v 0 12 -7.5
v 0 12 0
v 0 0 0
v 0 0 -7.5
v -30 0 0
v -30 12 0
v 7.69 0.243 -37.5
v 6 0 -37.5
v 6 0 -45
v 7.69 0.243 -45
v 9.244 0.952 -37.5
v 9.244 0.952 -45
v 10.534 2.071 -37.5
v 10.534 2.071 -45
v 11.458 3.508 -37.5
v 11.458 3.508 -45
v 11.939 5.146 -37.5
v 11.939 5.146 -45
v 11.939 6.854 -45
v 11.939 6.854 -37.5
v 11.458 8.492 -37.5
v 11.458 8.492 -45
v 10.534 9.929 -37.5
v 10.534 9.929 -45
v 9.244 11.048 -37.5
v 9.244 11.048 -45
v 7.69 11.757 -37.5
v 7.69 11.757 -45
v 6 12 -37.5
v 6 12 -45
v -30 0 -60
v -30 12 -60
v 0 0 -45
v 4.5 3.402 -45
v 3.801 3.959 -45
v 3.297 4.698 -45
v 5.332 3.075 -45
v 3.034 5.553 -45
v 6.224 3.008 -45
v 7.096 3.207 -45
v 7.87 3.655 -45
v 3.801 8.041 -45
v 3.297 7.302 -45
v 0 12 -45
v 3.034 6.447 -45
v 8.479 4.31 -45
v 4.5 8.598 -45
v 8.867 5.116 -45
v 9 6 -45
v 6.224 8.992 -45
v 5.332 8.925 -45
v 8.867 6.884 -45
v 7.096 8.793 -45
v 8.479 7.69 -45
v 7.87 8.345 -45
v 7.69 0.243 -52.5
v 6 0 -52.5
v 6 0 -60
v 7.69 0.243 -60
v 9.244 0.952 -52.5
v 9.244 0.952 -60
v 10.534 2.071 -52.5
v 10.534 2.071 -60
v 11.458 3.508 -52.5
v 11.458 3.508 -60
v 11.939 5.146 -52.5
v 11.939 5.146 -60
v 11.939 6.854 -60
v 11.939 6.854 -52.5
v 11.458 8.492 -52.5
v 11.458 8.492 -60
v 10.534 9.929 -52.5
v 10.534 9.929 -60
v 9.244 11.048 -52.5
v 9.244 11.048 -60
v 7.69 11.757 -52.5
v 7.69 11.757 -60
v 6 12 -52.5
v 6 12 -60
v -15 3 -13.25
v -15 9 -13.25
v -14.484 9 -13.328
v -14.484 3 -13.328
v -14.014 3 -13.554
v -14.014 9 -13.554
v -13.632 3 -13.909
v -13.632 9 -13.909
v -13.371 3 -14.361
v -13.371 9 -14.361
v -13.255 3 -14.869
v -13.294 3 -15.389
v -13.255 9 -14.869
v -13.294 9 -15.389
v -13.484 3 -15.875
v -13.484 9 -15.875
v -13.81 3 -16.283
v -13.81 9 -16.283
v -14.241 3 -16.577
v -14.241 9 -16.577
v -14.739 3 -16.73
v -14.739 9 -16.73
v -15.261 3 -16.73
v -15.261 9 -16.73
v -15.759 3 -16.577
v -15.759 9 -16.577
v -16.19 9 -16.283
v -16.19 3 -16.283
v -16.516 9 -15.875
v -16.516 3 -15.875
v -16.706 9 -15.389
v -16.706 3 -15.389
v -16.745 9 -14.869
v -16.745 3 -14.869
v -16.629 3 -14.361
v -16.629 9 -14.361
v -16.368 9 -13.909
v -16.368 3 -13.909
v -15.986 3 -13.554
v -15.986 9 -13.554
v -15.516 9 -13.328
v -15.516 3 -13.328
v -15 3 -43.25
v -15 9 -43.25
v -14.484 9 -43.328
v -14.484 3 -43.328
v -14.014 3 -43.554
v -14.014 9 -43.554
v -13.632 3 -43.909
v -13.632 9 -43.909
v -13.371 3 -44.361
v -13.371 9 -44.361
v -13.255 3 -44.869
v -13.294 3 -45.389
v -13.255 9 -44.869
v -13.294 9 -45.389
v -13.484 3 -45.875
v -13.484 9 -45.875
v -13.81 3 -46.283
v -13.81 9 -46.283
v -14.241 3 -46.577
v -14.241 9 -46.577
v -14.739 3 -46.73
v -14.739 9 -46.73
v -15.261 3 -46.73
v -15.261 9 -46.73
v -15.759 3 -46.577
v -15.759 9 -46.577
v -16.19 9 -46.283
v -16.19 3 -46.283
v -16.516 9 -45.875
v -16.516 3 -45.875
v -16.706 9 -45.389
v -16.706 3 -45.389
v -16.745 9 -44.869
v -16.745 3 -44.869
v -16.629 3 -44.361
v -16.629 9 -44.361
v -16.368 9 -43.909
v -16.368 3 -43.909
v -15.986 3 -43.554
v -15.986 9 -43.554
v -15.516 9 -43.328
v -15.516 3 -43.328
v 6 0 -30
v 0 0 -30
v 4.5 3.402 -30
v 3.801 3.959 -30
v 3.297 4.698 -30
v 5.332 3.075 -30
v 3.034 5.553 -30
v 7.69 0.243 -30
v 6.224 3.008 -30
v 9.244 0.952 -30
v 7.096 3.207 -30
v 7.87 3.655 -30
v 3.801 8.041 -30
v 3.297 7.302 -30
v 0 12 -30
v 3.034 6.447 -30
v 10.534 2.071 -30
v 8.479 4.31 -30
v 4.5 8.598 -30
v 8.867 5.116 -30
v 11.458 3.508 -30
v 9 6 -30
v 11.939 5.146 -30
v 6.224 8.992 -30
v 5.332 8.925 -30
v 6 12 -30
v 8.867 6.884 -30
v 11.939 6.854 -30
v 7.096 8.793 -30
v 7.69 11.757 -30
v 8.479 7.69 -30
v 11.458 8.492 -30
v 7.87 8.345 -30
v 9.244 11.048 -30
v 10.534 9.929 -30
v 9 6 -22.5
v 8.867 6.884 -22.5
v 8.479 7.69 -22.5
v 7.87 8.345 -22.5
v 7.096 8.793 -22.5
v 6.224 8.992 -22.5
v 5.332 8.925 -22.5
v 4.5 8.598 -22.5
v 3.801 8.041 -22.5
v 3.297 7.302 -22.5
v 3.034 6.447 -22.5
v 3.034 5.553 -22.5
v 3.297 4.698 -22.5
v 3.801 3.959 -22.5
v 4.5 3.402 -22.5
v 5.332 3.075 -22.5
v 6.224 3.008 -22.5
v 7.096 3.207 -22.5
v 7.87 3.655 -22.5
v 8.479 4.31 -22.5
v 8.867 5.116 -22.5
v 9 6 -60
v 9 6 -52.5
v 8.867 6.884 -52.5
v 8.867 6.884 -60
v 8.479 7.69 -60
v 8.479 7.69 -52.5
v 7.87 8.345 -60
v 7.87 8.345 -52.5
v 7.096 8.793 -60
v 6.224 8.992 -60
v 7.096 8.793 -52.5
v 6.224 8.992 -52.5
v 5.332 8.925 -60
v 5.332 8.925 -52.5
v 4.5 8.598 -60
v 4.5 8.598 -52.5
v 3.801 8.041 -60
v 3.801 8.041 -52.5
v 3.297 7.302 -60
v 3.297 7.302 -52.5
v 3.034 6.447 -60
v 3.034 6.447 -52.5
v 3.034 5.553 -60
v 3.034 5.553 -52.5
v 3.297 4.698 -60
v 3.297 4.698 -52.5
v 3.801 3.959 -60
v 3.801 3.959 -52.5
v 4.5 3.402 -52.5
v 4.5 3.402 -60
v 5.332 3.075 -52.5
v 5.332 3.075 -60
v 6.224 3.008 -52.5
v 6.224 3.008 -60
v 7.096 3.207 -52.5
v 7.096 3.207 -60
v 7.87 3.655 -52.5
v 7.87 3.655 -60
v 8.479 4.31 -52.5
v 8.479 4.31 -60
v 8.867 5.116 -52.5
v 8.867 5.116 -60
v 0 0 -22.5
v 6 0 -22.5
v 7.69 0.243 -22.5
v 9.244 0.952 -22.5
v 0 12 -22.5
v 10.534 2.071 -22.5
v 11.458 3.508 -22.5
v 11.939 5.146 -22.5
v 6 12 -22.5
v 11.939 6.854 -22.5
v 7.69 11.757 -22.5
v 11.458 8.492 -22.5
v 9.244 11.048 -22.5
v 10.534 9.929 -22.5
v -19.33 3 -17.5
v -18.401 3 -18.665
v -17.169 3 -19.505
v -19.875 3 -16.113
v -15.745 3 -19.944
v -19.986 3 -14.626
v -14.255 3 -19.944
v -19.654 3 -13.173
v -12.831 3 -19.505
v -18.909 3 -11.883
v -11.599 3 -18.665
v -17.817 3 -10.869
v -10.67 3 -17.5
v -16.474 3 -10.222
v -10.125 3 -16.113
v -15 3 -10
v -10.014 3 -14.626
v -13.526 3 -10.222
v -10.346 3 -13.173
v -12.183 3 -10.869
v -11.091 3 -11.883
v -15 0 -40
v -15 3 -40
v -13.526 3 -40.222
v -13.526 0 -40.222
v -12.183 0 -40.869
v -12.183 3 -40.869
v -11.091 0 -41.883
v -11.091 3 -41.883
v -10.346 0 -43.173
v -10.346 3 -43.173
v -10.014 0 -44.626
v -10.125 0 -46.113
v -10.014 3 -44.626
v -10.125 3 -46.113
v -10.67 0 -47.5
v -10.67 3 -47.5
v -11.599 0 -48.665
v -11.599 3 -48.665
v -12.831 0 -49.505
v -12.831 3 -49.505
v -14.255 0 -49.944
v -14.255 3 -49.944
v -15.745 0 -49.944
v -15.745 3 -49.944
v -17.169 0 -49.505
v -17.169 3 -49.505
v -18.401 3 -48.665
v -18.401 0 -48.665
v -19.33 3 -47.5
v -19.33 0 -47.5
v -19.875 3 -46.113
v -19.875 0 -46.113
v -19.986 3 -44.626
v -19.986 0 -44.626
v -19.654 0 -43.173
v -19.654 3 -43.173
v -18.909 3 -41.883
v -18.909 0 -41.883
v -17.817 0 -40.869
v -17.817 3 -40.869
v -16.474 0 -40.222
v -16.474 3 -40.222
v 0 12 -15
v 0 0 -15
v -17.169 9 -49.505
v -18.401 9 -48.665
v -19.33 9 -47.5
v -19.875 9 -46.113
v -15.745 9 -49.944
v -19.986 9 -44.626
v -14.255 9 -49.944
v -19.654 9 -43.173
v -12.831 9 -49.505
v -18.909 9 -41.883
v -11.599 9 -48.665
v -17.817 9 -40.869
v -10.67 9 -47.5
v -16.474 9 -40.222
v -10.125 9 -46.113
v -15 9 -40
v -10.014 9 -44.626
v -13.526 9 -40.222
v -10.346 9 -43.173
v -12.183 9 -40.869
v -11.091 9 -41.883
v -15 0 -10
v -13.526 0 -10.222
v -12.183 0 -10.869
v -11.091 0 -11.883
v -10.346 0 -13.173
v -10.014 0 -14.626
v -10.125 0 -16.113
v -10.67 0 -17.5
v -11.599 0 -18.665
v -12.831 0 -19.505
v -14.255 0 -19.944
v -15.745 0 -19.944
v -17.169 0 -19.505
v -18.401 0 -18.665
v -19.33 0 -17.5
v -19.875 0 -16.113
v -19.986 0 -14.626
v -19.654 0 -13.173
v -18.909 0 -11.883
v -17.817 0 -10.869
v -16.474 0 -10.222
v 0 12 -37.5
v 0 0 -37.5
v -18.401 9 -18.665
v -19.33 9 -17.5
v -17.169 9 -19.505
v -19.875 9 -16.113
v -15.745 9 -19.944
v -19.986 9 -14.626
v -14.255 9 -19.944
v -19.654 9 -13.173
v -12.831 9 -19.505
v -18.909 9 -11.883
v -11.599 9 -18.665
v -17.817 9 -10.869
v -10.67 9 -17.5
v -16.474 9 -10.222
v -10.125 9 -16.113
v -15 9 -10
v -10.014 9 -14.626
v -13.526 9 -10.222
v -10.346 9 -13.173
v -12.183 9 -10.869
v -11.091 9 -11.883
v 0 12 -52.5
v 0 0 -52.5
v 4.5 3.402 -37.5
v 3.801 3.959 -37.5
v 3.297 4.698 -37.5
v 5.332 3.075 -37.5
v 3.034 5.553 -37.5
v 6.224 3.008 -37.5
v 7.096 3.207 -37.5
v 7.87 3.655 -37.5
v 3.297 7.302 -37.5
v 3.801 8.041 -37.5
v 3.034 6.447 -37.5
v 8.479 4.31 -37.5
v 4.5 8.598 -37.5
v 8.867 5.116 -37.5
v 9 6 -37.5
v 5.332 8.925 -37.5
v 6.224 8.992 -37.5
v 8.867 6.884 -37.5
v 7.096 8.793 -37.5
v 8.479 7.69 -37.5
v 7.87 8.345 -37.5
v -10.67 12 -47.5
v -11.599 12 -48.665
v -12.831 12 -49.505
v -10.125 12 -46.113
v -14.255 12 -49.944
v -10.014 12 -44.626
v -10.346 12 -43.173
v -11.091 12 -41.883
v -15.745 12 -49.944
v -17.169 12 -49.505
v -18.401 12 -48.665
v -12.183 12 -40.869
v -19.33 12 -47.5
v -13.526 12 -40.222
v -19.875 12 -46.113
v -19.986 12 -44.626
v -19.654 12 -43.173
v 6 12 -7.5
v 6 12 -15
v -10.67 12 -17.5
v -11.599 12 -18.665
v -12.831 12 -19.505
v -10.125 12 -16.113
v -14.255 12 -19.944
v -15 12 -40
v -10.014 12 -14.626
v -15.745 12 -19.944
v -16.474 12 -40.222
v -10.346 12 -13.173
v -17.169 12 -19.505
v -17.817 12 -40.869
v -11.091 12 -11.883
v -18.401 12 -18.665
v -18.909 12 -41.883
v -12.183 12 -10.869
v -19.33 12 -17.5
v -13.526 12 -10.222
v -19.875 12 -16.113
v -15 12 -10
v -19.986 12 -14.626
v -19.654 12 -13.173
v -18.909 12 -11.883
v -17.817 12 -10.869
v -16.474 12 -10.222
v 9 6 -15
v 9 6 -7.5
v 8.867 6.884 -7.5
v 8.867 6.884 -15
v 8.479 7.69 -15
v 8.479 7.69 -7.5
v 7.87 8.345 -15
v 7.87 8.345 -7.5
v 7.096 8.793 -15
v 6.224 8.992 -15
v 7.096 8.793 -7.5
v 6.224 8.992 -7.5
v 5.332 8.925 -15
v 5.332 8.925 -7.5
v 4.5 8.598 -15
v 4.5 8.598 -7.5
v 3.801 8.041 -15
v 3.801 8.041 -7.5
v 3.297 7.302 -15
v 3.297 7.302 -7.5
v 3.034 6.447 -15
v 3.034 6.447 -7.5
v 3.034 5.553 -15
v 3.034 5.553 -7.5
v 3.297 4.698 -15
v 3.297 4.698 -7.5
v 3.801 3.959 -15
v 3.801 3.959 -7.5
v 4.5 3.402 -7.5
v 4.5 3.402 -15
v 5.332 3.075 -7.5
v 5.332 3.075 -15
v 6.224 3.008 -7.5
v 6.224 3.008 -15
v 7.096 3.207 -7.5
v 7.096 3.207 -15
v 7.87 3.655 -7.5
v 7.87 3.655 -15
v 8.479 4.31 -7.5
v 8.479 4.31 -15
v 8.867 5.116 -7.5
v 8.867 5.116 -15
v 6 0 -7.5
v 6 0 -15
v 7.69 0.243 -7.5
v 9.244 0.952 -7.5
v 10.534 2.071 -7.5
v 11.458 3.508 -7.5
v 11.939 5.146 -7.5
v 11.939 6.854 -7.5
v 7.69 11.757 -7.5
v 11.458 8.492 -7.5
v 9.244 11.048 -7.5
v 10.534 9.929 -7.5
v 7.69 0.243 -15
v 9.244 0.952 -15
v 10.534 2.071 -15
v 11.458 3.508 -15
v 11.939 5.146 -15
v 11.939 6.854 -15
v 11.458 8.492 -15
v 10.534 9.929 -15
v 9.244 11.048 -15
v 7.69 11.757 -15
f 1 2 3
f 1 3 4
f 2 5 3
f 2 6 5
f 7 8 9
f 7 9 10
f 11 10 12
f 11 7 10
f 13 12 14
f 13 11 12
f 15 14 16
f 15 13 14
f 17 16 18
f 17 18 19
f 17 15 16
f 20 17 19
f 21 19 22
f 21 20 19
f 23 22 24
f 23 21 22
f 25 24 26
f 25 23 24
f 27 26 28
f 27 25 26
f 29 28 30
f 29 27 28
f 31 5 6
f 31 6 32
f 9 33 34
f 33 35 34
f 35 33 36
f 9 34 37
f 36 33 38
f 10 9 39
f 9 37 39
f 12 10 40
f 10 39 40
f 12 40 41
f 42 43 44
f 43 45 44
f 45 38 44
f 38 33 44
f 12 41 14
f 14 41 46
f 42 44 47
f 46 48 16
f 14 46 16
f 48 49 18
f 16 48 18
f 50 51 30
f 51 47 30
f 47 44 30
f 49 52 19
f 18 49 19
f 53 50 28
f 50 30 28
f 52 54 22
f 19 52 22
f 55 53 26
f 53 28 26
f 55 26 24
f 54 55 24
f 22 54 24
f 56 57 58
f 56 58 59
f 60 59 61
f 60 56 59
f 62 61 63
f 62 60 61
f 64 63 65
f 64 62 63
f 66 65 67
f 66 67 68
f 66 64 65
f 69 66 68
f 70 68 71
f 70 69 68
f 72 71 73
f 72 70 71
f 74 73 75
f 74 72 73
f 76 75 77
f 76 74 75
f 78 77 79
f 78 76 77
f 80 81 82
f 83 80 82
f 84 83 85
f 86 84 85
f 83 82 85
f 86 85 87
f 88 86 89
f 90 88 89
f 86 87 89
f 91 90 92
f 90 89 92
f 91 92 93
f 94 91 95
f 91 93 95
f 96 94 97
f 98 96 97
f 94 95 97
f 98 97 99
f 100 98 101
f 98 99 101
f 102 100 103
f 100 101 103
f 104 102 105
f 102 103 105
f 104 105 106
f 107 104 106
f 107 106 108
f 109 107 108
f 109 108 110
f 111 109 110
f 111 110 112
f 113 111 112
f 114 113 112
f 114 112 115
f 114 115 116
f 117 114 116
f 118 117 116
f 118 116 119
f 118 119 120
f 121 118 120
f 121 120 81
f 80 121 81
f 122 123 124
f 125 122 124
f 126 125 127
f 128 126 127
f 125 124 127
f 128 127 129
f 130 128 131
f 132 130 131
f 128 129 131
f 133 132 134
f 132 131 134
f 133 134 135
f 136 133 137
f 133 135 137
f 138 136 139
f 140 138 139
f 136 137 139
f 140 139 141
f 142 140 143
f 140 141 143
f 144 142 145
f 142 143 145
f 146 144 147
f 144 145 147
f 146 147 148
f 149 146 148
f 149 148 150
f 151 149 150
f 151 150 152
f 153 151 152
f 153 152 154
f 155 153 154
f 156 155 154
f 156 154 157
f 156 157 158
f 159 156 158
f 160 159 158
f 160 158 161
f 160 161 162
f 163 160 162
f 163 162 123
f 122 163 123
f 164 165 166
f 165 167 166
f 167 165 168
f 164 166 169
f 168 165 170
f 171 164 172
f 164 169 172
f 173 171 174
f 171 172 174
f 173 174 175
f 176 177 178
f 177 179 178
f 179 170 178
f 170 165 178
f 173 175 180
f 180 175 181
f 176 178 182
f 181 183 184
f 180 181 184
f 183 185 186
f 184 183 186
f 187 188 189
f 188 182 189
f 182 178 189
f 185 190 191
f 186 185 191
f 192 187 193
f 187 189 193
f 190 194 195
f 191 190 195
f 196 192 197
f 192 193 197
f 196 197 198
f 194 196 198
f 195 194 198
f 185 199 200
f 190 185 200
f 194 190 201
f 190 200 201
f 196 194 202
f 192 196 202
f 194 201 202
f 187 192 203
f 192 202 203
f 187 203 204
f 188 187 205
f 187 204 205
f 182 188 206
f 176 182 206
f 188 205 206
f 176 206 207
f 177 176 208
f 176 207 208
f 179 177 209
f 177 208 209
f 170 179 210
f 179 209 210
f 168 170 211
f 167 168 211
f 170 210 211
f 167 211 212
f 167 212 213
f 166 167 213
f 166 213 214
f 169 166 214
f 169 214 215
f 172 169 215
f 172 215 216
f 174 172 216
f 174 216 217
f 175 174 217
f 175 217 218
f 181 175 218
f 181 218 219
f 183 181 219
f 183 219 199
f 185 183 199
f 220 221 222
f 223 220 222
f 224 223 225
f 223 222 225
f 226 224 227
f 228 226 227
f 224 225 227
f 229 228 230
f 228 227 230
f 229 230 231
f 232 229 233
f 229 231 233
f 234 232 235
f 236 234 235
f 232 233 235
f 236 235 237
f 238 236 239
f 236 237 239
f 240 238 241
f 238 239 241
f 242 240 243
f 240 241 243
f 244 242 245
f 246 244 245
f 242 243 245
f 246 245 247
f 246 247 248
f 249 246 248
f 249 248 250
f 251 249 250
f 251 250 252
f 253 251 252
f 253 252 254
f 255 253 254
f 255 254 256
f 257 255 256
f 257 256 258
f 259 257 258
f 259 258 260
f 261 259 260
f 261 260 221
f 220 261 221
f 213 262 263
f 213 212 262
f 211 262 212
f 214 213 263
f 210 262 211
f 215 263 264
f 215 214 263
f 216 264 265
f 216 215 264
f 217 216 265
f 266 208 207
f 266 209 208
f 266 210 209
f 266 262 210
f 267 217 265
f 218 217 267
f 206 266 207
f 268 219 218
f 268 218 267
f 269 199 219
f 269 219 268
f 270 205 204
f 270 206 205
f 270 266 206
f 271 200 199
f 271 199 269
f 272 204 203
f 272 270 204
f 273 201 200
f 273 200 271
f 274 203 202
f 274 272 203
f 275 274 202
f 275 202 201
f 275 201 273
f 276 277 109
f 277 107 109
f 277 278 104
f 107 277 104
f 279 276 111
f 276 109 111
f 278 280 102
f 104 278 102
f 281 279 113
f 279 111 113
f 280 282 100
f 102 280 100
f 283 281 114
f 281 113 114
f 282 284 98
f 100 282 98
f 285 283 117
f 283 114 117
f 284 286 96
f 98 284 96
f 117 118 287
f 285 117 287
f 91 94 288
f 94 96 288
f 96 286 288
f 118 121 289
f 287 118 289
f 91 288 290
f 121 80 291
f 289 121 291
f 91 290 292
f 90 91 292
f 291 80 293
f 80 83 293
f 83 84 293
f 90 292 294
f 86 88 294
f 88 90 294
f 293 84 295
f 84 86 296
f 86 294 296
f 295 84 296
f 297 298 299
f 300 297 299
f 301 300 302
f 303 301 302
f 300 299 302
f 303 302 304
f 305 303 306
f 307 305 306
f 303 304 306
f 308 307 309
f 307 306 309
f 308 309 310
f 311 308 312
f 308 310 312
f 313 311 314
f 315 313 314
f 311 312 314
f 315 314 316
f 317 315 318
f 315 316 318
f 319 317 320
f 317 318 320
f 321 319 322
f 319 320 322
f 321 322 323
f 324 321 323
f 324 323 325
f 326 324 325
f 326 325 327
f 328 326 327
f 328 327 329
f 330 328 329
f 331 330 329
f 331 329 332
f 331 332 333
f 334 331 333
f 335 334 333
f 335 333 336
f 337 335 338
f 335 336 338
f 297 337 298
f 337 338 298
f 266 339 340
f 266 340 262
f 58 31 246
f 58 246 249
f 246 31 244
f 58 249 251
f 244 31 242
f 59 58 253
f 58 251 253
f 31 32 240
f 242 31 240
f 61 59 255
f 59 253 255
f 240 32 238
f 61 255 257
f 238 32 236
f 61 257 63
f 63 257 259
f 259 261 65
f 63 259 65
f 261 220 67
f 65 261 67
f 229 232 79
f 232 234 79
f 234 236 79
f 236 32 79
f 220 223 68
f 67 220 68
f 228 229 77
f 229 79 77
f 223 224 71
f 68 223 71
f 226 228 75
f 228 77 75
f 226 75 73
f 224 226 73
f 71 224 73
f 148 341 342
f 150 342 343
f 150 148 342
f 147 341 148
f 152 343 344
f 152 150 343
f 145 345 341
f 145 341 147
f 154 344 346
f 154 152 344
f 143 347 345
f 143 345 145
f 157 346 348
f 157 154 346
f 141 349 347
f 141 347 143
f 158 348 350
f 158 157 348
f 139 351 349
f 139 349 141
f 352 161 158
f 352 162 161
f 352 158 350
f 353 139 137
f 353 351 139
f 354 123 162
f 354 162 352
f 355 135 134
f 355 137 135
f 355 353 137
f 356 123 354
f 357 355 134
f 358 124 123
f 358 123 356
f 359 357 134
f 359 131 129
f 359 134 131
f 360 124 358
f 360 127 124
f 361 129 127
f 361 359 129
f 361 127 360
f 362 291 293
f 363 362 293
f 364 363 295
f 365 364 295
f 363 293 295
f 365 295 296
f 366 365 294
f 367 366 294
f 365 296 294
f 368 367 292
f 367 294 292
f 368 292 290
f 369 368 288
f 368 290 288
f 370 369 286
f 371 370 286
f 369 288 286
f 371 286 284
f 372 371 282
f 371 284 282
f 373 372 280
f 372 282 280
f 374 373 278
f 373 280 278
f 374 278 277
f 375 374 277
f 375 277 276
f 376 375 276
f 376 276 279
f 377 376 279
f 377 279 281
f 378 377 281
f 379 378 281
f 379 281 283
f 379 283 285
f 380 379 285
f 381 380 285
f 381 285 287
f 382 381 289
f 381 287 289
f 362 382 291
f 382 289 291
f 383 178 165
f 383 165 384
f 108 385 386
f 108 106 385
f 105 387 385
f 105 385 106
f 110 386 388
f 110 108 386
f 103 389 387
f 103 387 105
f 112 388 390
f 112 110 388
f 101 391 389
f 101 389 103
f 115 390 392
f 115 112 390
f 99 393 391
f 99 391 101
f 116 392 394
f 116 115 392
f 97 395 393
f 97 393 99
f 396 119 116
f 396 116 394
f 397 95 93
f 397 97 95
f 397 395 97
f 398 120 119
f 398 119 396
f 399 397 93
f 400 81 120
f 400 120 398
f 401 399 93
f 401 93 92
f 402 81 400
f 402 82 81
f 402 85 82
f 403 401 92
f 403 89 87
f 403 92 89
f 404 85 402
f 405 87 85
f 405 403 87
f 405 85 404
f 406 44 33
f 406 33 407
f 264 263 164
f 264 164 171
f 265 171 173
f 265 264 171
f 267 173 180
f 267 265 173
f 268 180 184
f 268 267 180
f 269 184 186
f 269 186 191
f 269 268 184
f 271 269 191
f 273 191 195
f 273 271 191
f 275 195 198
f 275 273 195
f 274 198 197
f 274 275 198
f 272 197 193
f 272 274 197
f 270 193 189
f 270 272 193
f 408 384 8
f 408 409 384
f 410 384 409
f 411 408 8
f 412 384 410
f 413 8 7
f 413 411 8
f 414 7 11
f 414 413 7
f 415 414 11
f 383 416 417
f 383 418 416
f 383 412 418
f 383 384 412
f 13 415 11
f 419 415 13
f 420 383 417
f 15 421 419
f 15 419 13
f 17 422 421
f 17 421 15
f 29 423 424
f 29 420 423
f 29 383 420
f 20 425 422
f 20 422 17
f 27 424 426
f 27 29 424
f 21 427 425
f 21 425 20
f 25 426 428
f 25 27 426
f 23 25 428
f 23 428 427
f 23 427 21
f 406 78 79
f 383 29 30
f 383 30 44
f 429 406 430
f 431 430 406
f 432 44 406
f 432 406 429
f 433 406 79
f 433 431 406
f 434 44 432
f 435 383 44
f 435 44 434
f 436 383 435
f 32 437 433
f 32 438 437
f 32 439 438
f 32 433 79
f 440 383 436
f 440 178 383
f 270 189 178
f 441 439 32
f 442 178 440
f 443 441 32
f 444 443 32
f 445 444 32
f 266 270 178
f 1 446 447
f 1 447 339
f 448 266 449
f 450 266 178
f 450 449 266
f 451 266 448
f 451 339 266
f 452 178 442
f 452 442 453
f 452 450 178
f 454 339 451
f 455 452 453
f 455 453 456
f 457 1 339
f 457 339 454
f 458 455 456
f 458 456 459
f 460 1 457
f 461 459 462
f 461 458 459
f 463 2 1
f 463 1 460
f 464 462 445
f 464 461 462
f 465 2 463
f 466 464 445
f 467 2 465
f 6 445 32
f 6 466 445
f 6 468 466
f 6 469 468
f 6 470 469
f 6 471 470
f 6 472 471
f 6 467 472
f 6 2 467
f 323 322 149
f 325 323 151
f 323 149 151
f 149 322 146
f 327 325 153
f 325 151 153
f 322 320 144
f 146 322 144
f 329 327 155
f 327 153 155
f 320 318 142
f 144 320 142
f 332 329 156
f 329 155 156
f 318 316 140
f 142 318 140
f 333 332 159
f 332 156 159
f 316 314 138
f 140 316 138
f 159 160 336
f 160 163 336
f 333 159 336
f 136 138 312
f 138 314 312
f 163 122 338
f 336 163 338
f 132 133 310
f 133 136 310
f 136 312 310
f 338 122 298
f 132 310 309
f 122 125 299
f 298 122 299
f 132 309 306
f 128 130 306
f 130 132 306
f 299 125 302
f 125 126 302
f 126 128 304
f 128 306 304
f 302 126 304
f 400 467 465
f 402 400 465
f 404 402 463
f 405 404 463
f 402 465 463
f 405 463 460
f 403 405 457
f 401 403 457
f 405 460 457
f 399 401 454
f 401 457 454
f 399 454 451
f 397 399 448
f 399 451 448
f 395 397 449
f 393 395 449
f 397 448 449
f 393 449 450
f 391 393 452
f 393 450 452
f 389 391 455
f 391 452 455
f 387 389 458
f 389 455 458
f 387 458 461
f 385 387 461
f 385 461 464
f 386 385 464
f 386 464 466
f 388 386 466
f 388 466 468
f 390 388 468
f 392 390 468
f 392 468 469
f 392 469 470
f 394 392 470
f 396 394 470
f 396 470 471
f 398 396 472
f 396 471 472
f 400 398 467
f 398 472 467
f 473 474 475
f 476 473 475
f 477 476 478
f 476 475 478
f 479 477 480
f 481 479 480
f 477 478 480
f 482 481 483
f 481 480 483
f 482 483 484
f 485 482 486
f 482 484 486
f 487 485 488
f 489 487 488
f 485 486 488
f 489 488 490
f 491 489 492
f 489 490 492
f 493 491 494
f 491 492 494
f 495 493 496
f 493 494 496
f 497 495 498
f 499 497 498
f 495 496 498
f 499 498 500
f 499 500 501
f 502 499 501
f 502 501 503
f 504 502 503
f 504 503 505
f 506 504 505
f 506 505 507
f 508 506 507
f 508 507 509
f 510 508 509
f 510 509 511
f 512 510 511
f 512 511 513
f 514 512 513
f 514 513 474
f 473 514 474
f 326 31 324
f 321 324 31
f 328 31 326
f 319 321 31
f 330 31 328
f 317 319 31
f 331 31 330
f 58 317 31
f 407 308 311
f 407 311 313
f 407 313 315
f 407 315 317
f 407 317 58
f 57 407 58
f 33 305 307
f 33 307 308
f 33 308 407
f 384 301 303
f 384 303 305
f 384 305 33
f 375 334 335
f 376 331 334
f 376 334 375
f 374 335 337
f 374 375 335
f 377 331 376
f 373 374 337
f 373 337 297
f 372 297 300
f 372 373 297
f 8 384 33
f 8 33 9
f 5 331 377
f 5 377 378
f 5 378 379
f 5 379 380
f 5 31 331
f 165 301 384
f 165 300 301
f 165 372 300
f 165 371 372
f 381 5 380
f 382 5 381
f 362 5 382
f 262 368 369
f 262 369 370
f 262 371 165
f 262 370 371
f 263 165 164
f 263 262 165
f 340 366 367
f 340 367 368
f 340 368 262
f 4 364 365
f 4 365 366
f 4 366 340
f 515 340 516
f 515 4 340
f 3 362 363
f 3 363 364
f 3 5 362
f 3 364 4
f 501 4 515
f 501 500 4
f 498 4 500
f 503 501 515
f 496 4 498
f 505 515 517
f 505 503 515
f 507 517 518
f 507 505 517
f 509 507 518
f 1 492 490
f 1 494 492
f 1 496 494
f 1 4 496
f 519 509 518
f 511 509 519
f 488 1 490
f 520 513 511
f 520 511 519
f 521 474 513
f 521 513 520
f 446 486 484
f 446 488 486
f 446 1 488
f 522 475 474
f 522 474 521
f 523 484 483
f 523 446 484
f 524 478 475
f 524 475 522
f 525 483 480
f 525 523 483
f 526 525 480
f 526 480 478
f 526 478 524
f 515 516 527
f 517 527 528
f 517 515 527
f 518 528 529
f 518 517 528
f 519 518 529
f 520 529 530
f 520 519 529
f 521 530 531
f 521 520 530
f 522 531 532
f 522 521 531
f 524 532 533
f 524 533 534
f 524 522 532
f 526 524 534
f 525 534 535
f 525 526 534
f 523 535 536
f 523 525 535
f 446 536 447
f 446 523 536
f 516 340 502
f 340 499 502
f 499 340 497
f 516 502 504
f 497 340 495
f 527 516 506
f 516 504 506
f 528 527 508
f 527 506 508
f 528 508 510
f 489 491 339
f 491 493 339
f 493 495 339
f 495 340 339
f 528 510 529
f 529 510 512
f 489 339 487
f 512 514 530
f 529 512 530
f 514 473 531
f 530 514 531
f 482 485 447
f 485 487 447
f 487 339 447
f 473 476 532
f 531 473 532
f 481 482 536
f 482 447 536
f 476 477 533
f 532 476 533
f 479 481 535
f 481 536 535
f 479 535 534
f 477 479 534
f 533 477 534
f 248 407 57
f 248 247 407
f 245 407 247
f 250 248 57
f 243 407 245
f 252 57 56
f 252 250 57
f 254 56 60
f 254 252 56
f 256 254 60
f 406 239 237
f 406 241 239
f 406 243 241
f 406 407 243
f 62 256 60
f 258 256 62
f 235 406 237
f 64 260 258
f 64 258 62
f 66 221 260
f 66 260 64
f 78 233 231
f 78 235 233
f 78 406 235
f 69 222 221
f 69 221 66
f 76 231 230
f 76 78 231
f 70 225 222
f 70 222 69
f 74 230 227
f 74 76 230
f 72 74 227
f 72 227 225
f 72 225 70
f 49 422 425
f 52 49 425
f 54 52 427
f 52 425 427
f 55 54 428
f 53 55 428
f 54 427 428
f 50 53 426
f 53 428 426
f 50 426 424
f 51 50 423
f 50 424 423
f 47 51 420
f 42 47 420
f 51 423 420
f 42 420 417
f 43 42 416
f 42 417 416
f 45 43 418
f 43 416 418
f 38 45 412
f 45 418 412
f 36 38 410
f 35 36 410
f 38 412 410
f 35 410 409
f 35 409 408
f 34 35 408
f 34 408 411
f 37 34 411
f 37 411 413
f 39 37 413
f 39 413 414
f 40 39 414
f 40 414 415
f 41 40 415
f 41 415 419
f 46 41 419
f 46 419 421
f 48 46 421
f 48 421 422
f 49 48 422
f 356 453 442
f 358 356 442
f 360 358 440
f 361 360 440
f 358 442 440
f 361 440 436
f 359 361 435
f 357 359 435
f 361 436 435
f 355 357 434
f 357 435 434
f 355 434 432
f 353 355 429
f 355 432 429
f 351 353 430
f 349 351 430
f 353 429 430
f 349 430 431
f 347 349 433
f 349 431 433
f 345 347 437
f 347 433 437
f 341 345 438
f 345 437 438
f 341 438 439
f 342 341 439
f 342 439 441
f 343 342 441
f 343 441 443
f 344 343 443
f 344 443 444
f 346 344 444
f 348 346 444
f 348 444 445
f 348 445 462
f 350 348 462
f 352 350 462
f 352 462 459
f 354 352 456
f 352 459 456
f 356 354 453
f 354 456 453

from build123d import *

# Parameters (mm, degrees)
SKETCH1_W           = 30
SKETCH1_H           = 60
BOSS_EXTRUDE1_DEPTH = 12
SKETCH2_R           = 3
BOSS_EXTRUDE2_DEPTH = 60
SKETCH3_W           = 12
SKETCH3_H           = 7.5
CUT_EXTRUDE1_DEPTH  = 69.14690015
LPATTERN1_COUNT     = 4
LPATTERN1_PITCH     = 15
SKETCH4_R           = 1.75
CUT_EXTRUDE2_DEPTH  = 69.14690015
SKETCH5_R           = 5
CUT_EXTRUDE3_DEPTH  = 3
LPATTERN2_COUNT     = 2
LPATTERN2_PITCH     = 9


with BuildPart() as part:
    # Sketch1 → Boss-Extrude1 (new body)
    with BuildSketch(Plane(origin=(0, 0, 0), x_dir=(1, 0, 0), z_dir=(0, 1, 0))):
        with Locations((-15, 30)):
            Rectangle(SKETCH1_W, SKETCH1_H)
    extrude(amount=BOSS_EXTRUDE1_DEPTH)

    # Sketch2 → Boss-Extrude2 (add)
    with BuildSketch(Plane.XY):
        with BuildLine():
            Line((0, 6), (0, 0))
            Line((0, 0), (6, 0))
            ThreePointArc((6, 0), (12, 6), (6, 12))
            Line((6, 12), (0, 12))
            Line((0, 12), (0, 6))
        make_face()
        with Locations((6, 6)):
            Circle(SKETCH2_R, mode=Mode.SUBTRACT)
    extrude(amount=-BOSS_EXTRUDE2_DEPTH)

    # Sketch3 → Cut-Extrude1 (cut, through all)
    with BuildSketch(Plane(origin=(0, 12, 0), x_dir=(1, 0, 0), z_dir=(0, 1, 0))):
        with Locations((6, 48.75)):
            Rectangle(SKETCH3_W, SKETCH3_H)
    cut_extrude1 = extrude(amount=-CUT_EXTRUDE1_DEPTH, mode=Mode.SUBTRACT)

    # LPattern1: Cut-Extrude1 ×4
    with Locations(*[(0, 0, i * LPATTERN1_PITCH) for i in range(1, LPATTERN1_COUNT)]):
        add(cut_extrude1, mode=Mode.SUBTRACT)

    # Sketch4 → Cut-Extrude2 (cut, through all)
    with BuildSketch(Plane(origin=(0, 12, 0), x_dir=(1, 0, 0), z_dir=(0, 1, 0))):
        with Locations(Location((-15, 45, 0), (0, 0, 270))):
            Circle(SKETCH4_R)
        with Locations(Location((-15, 15, 0), (0, 0, 270))):
            Circle(SKETCH4_R)
    extrude(amount=-CUT_EXTRUDE2_DEPTH, mode=Mode.SUBTRACT)

    # Sketch5 → Cut-Extrude3 (cut)
    with BuildSketch(Plane(origin=(0, 12, 0), x_dir=(1, 0, 0), z_dir=(0, 1, 0))):
        with Locations(Location((-15, 45, 0), (0, 0, 270))):
            Circle(SKETCH5_R)
        with Locations(Location((-15, 15, 0), (0, 0, 270))):
            Circle(SKETCH5_R)
    cut_extrude3 = extrude(amount=-CUT_EXTRUDE3_DEPTH, mode=Mode.SUBTRACT)

    # LPattern2: Cut-Extrude3 ×2
    with Locations(*[(0, -i * LPATTERN2_PITCH, 0) for i in range(1, LPATTERN2_COUNT)]):
        add(cut_extrude3, mode=Mode.SUBTRACT)


solid = part.part
